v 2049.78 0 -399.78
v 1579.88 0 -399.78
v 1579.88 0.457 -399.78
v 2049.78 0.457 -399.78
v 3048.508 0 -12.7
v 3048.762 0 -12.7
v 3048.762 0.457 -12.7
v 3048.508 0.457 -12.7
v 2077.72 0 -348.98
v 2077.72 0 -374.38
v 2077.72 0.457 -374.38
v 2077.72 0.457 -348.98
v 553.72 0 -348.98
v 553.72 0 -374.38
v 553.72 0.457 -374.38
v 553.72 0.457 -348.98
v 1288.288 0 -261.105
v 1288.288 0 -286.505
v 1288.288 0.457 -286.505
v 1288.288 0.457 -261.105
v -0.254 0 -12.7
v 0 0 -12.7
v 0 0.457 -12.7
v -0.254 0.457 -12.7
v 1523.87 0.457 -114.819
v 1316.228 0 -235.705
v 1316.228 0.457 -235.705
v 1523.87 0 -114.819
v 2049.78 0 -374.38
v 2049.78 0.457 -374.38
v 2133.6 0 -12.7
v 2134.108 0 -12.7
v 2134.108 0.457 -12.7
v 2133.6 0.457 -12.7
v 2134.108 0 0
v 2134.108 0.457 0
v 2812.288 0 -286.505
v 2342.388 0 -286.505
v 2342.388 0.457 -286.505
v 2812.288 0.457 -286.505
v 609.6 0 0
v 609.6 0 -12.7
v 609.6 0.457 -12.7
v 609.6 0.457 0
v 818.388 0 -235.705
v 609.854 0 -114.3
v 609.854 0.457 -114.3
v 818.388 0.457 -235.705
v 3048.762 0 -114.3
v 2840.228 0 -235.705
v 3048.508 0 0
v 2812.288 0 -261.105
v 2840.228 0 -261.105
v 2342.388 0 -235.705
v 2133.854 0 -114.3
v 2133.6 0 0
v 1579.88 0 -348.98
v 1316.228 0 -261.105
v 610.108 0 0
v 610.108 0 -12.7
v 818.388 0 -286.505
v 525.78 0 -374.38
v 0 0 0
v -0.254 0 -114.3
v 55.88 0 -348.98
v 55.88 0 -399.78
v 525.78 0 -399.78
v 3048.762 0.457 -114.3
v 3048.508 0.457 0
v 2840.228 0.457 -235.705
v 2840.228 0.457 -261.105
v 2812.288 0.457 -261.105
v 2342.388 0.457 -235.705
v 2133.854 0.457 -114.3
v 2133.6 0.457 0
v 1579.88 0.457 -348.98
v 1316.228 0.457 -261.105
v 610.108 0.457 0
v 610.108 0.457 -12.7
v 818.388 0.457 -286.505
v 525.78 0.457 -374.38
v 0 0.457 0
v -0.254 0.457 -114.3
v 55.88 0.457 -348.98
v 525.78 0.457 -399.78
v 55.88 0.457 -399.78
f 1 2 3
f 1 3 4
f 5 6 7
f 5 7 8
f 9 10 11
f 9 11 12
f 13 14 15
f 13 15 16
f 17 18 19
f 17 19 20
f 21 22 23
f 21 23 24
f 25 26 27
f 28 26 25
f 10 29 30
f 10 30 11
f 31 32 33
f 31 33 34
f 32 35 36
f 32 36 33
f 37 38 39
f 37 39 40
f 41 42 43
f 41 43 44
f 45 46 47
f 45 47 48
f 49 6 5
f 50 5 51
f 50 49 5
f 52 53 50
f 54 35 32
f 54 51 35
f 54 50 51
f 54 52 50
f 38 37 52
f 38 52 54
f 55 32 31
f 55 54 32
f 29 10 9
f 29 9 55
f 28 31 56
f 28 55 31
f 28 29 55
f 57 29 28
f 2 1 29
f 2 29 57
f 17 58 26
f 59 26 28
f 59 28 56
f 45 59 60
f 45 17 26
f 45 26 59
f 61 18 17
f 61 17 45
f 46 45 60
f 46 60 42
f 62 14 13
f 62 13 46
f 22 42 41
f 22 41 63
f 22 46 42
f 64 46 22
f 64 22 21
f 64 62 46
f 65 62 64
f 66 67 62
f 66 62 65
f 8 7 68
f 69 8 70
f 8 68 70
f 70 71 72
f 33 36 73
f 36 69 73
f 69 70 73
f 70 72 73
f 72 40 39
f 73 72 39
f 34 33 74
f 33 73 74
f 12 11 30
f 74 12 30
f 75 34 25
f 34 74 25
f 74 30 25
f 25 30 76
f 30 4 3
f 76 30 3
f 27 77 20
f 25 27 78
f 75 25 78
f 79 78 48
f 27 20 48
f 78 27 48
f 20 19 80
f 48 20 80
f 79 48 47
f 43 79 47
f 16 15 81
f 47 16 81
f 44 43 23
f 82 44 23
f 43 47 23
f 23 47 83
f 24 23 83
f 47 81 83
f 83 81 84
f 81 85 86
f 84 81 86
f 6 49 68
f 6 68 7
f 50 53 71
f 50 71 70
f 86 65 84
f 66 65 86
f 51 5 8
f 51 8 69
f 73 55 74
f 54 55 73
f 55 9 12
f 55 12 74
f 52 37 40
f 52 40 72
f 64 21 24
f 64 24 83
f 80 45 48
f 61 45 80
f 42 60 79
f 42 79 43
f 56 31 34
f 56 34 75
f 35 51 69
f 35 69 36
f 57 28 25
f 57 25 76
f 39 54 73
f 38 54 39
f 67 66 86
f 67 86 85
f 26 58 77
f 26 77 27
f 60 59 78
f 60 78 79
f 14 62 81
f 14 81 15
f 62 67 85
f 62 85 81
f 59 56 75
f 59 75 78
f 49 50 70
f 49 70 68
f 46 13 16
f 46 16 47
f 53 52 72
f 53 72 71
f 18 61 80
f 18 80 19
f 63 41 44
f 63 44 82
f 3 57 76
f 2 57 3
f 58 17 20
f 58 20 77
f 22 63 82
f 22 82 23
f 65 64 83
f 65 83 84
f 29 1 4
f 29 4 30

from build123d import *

# Parameters (mm, degrees)
BOSS_EXTRUDE1_DEPTH = 0.4572
BOSS_EXTRUDE2_DEPTH = 0.4572
LPATTERN1_COUNT     = 2
LPATTERN1_PITCH     = 1524


with BuildPart() as part:
    # Sketch1 → Boss-Extrude1 (new body)
    with BuildSketch(Plane(origin=(0, 0, 0), x_dir=(1, 0, 0), z_dir=(0, 1, 0))):
        Polygon((0, 0), (0, 12.7), (-0.254, 12.7), (-0.254, 114.3), (55.88, 348.97991828), (55.88, 399.77991828), (525.78, 399.77991828), (525.78, 374.37991828), (553.72, 374.37991828), (553.72, 348.97991828), (609.854, 114.3), (609.854, 12.7), (609.6, 12.7), (609.6, 0), align=None)
    boss_extrude1 = extrude(amount=BOSS_EXTRUDE1_DEPTH)

    # Sketch3 → Boss-Extrude2 (add)
    with BuildSketch(Plane(origin=(0, 0, 0), x_dir=(1, 0, 0), z_dir=(0, 1, 0))):
        Polygon((610.108, 0), (610.108, 12.7), (609.854, 12.7), (609.854, 114.3), (818.388, 235.705357559), (818.388, 286.505357559), (1288.288, 286.505357559), (1288.288, 261.105357559), (1316.228, 261.105357559), (1316.228, 235.705357559), (1524.762, 114.3), (1524.762, 12.7), (1524.508, 12.7), (1524.508, 0), align=None)
    boss_extrude2 = extrude(amount=BOSS_EXTRUDE2_DEPTH)

    # LPattern1: Boss-Extrude1, Boss-Extrude2 ×2
    with Locations(*[(i * LPATTERN1_PITCH, 0, 0) for i in range(1, LPATTERN1_COUNT)]):
        add(boss_extrude1)
        add(boss_extrude2)


solid = part.part
